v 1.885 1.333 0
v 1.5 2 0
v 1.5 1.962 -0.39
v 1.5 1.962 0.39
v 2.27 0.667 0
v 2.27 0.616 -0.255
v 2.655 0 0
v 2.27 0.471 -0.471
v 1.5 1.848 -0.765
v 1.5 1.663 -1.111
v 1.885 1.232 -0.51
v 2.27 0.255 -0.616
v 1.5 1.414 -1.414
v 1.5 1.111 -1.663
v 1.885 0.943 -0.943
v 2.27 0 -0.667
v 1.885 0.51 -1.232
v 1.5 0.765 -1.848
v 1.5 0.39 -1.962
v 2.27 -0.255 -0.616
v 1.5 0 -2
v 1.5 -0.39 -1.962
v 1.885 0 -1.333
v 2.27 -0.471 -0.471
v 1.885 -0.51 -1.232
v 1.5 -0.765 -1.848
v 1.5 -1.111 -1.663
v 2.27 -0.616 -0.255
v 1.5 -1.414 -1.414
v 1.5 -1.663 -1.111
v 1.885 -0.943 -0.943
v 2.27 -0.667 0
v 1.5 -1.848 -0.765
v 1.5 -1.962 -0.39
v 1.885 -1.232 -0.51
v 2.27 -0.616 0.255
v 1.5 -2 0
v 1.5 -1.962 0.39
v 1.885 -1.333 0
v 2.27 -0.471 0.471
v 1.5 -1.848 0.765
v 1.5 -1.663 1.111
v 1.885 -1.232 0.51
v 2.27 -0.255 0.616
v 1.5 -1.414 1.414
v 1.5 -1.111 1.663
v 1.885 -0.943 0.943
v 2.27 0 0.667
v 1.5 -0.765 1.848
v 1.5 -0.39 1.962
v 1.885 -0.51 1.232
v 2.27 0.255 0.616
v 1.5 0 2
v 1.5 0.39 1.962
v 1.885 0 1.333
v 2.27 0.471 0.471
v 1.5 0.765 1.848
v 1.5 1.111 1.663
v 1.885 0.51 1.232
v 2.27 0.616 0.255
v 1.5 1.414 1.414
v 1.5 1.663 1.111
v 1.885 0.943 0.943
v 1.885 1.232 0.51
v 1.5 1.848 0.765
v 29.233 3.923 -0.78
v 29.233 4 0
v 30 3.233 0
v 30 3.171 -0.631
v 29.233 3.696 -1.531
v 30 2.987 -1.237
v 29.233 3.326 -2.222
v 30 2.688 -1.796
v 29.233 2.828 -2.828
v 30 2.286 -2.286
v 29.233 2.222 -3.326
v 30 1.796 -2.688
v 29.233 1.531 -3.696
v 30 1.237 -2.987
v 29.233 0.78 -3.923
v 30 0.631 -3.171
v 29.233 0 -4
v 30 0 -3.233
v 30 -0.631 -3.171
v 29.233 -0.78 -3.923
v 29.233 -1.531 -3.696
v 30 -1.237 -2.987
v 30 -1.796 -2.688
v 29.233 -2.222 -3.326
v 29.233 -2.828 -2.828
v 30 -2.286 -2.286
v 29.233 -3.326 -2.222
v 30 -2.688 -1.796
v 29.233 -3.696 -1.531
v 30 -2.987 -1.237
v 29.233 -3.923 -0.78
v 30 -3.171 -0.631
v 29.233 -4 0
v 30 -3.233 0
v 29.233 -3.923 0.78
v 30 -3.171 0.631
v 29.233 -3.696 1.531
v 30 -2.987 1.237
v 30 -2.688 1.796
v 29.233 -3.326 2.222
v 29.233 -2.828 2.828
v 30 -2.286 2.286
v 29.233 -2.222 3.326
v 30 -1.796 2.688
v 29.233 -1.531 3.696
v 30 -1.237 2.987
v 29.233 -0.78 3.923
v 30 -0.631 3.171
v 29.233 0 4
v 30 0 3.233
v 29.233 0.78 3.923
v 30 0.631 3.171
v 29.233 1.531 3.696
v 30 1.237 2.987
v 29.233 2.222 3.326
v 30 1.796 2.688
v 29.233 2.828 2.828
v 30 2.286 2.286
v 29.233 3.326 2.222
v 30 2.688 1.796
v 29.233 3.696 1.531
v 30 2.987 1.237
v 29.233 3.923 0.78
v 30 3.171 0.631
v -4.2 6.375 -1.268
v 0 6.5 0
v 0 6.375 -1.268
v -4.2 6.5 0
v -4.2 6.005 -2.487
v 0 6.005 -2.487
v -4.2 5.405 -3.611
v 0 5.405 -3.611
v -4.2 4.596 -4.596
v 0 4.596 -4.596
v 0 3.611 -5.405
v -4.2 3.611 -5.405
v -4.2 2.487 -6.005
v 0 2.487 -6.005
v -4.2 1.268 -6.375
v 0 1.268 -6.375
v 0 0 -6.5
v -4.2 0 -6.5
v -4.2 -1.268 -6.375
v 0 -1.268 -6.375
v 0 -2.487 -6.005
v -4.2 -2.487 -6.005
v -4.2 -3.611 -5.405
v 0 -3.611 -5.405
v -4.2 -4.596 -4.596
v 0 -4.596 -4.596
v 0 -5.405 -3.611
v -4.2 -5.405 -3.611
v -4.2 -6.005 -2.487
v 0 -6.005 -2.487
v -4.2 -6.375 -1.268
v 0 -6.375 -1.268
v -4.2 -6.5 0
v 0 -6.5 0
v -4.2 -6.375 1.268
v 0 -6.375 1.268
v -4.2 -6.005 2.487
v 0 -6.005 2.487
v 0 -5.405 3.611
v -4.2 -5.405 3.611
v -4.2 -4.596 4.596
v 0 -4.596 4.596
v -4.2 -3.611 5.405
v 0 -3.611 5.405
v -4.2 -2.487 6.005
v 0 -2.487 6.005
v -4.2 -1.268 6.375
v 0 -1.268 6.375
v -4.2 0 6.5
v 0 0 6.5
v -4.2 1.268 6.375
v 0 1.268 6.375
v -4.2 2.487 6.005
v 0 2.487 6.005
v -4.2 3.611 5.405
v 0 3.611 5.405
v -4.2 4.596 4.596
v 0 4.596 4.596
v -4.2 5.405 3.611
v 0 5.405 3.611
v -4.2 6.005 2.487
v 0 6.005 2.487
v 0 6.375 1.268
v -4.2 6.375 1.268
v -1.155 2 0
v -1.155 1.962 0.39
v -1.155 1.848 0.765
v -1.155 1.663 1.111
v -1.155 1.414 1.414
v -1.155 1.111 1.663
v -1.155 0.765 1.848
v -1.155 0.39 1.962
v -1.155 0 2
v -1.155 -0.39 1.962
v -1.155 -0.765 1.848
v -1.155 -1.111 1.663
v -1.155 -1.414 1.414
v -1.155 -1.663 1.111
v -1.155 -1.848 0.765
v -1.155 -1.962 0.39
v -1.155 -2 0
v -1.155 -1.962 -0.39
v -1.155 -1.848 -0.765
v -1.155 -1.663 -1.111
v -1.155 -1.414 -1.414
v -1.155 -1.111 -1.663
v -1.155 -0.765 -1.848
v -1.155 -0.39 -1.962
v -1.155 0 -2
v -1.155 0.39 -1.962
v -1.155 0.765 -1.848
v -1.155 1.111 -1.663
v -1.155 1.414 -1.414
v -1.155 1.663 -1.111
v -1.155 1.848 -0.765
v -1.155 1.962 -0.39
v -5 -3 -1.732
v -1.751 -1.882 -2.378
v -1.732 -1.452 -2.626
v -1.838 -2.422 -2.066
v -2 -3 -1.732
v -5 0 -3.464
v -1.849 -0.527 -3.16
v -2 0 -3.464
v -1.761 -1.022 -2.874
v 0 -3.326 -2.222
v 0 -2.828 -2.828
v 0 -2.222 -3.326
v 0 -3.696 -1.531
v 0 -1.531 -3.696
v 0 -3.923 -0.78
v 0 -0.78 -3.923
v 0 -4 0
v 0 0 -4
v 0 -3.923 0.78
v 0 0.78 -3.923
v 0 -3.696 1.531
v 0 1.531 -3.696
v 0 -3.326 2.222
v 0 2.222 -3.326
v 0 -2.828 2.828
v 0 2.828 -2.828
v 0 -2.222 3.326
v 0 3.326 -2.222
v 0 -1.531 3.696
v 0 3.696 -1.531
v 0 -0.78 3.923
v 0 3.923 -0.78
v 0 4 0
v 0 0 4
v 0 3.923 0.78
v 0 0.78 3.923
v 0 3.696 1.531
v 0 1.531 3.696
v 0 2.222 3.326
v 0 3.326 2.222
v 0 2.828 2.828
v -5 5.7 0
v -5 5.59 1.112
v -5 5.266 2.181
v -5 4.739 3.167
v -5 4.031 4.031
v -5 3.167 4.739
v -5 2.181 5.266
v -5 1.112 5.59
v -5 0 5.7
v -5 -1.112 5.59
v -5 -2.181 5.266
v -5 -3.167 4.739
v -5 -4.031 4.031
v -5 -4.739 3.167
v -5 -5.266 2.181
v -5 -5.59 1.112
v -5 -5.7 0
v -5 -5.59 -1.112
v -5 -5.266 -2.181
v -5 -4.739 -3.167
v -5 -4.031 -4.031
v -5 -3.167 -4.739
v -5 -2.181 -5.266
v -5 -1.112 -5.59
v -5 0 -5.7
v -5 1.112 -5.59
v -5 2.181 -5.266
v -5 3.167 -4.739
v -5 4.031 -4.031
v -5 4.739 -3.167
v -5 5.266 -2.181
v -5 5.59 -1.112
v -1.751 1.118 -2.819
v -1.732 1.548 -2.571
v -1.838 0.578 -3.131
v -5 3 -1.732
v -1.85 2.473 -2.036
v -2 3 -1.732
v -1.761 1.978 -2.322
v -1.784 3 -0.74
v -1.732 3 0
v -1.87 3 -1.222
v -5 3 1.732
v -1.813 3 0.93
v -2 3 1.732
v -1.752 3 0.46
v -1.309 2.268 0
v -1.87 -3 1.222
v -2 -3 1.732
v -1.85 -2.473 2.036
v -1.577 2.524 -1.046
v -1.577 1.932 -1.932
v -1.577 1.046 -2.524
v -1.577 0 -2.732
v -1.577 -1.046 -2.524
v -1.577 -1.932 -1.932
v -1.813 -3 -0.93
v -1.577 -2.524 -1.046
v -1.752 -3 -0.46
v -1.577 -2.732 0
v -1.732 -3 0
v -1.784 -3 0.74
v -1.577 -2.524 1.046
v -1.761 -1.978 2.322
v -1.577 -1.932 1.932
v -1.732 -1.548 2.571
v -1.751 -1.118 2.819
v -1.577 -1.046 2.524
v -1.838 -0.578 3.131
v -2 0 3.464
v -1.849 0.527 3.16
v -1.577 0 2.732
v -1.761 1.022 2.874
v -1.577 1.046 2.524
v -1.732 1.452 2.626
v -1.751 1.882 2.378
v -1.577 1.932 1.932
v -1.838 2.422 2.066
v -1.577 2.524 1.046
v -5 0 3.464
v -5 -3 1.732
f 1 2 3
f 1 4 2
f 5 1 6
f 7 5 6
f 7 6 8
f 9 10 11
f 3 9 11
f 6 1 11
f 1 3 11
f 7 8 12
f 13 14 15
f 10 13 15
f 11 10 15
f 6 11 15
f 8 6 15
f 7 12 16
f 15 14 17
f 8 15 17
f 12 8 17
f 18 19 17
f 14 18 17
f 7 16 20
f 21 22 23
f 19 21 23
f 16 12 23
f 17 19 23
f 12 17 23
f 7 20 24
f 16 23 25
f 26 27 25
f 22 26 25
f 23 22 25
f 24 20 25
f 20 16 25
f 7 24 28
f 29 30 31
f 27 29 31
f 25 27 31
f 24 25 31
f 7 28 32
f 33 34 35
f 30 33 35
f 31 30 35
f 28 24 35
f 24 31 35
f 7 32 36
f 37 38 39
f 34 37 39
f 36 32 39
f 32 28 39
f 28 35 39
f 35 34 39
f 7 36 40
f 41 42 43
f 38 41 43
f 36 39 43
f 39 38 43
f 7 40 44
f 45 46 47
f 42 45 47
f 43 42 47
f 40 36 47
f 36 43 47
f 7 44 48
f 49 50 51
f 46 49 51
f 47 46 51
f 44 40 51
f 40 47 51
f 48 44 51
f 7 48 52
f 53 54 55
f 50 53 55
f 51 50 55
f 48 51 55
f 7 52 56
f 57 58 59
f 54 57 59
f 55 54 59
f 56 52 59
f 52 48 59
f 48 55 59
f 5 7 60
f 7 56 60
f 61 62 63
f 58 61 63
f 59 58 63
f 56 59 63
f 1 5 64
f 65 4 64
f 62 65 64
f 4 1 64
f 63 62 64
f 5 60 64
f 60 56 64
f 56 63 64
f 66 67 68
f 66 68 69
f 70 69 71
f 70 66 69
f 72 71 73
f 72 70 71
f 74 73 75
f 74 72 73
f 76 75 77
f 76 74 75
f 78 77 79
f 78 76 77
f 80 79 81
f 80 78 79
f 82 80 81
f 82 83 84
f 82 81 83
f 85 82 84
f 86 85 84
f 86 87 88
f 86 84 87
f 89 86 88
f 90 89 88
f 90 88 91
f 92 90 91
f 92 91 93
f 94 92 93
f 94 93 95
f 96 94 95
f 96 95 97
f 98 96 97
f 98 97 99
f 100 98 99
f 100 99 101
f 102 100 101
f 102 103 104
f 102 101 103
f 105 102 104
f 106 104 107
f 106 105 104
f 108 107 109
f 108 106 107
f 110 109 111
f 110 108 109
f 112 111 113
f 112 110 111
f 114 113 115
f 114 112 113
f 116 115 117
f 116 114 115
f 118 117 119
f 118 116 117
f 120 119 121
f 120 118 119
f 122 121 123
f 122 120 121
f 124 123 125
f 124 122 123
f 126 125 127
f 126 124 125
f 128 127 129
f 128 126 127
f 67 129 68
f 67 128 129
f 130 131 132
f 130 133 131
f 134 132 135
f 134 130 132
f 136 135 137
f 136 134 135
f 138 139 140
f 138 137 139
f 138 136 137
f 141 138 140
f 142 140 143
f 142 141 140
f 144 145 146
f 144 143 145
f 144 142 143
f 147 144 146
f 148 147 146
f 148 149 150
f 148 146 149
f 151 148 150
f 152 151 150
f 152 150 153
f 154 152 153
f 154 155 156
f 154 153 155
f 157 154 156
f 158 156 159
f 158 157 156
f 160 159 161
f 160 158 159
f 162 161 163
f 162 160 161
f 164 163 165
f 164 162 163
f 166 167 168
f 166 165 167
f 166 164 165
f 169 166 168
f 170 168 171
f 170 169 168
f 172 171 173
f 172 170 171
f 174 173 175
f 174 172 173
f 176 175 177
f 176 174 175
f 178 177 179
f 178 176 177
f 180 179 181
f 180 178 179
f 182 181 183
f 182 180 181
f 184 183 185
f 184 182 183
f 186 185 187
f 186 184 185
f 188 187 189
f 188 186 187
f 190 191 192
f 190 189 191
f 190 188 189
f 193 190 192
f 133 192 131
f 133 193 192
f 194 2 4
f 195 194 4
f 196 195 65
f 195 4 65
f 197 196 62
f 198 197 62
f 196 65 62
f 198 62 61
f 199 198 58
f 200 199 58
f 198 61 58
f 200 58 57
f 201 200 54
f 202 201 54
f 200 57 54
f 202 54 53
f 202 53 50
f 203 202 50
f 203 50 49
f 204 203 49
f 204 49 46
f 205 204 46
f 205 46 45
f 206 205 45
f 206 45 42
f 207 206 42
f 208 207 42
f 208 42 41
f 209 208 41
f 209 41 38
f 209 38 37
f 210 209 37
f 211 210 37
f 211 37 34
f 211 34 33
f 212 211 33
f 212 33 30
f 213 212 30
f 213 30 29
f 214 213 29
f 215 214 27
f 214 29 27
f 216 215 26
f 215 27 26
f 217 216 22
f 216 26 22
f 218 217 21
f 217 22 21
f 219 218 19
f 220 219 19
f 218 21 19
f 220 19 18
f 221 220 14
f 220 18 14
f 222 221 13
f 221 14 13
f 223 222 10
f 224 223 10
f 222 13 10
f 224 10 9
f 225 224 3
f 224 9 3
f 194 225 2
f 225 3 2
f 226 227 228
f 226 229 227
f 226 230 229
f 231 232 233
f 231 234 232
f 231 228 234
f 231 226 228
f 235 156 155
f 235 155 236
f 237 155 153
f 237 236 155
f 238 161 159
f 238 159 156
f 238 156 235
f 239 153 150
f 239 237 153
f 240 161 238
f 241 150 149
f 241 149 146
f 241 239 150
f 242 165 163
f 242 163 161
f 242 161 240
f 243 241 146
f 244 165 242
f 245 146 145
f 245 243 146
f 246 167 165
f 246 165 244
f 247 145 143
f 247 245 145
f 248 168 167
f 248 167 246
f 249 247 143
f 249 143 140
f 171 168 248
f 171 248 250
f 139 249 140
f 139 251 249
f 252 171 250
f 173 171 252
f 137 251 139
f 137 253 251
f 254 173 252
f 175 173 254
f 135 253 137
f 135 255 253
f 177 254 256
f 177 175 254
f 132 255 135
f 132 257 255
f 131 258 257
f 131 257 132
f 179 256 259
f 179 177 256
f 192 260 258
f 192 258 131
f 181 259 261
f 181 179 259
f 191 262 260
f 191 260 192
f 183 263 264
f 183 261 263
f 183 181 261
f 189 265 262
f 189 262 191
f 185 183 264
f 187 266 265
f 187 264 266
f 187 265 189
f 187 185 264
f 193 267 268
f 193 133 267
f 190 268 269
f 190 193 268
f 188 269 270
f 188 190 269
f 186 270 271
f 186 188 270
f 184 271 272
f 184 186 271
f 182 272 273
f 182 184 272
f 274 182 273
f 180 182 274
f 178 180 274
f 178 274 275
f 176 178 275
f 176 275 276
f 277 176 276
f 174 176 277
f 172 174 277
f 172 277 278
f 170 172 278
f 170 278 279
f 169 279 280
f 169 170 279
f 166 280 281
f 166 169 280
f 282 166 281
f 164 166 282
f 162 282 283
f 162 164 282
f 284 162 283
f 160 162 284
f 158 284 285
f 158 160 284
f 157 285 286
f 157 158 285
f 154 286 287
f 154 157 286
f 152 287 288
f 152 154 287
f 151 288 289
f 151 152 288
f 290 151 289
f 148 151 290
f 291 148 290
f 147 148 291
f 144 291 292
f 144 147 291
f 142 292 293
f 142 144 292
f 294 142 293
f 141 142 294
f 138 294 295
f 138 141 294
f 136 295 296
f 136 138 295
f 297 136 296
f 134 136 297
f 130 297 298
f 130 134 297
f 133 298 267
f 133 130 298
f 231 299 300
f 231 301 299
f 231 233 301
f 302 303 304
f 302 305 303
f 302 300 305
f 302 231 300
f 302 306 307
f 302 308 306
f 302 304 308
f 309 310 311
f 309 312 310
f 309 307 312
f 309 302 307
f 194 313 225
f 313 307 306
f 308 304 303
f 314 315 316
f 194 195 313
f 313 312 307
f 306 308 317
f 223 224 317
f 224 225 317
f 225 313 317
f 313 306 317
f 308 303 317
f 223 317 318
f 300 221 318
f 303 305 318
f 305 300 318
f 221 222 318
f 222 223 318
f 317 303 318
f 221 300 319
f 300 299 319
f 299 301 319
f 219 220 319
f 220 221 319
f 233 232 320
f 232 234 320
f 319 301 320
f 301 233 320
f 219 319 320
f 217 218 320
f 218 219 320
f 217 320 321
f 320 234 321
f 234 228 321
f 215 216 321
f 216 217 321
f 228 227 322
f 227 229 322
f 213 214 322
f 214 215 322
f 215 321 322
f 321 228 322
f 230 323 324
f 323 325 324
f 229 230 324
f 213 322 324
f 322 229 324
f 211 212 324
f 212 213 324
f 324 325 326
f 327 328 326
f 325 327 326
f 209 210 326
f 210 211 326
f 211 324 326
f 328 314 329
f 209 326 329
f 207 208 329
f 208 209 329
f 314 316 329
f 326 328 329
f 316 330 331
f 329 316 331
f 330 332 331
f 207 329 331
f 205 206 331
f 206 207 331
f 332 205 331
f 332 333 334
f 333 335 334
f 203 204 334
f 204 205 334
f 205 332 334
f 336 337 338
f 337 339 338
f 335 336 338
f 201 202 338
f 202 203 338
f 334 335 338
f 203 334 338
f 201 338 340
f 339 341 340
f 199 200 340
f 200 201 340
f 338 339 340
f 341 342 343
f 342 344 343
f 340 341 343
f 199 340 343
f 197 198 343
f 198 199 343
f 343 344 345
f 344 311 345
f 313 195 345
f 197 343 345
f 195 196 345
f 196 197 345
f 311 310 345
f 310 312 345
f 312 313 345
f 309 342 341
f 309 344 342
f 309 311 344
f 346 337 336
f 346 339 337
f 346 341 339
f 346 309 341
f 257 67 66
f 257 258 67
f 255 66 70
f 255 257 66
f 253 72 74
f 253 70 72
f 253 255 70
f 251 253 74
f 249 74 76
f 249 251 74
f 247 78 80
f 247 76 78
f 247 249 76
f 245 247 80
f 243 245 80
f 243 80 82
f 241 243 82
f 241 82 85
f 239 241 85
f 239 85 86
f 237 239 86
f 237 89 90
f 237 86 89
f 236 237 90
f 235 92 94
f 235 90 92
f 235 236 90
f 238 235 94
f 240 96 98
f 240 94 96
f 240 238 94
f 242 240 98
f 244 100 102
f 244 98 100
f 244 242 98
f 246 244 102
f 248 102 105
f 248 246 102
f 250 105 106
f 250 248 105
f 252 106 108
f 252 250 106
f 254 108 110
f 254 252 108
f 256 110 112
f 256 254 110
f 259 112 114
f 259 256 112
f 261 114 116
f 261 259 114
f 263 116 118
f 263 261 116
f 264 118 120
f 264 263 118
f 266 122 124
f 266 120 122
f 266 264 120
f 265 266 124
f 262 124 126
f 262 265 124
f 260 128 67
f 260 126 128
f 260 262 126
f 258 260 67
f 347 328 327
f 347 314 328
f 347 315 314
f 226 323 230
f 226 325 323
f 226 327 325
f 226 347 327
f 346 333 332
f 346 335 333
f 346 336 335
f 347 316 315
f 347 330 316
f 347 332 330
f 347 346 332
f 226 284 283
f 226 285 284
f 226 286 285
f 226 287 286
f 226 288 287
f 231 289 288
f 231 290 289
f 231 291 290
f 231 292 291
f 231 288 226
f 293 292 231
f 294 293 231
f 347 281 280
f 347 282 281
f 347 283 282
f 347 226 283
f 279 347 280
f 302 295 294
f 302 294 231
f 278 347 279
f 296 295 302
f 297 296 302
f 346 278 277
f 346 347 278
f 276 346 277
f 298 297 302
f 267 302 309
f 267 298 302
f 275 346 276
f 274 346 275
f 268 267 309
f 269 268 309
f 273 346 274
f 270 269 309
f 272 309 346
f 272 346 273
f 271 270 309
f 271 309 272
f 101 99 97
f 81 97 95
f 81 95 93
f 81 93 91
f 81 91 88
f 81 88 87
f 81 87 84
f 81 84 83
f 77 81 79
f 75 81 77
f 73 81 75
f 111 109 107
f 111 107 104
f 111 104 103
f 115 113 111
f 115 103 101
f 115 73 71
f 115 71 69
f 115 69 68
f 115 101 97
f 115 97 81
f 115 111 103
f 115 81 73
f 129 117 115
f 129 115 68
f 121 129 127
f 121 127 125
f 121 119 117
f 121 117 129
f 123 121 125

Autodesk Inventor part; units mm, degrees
ref_plane "YZ Plane" through (0, 0, 0) normal (1, 0, 0) x (0, 1, 0)
ref_plane "XZ Plane" through (0, 0, 0) normal (0, 1, 0) x (-1, 0, 0)
sketch "Schizzo1" plane through (0, 0, 0) normal (0, 0, 1) x (1, 0, 0)
  line L0 (2.6547, 0) -> (30, 0)
  line L1 (30, 0) -> (30, 4)
  line L2 (30, 4) -> (0, 4)
  line L3 (0, 4) -> (0, 6.5)
  line L4 (0, 6.5) -> (-5, 6.5)
  line L5 (-5, 6.5) -> (-5, 3.4641)
  line L6 (-5, 3.4641) -> (-2, 3.4641)
  line L7 (-2, 3.4641) -> (-1.1547, 2)
  line L8 (-12, 0) -> (37, 0) projected
  line L9 (0, -1.3) -> (0, 7.8) projected
  line L10 (-1.1547, 2) -> (1.5, 2)
  line L11 (1.5, 2) -> (2.6547, 0)
  line L12 (-5, 3.4641) -> (-5, 0) construction
  line L13 (-5, 5.7) -> (-4.2, 6.5)
  dimension "d0" = 5
  dimension "d1" = 3
  dimension "d2" = 60
  dimension "d3" = 8
  dimension "d4" = 6.9282
  dimension "d5" = 13
  dimension "d15" = 6.5
  dimension "d16" = 4
  dimension "d17" = 30
  dimension "d32" = 45
  dimension "d33" = 0.8
revolve "Corpo" add sketch "Schizzo1" angle 360 about axis through (2.6547, 0, 0) along (1, 0, 0) contours L11 L10 L9 L2 L1 L0 | L10 L7 L6 L5 L13 L4 L3 L9 | L13 L5 L4
revolve "Smusso2" cut sketch "Schizzo1" angle 360 about axis through (-10, 0, 0) along (1, 0, 0) contours L13 L5 L4
sketch "Schizzo2" plane through (-5, 0, 0) normal (-1, 0, 0) x (0, 0, 1)
  circle A0 centre (0, 0) radius 3.4641 projected
  line L0 (0, -9.1) -> (0, 9.1) projected
  line L1 (-9.1, 0) -> (9.1, 0) projected
  line L2 (3.4641, 0) -> (1.7321, -3)
  line L3 (1.7321, -3) -> (-1.7321, -3)
  line L4 (-1.7321, -3) -> (-3.4641, 0)
  line L5 (-3.4641, 0) -> (-1.7321, 3)
  line L6 (-1.7321, 3) -> (1.7321, 3)
  line L7 (1.7321, 3) -> (3.4641, 0)
  point P0 (0, 0)
extrude "Intaglio" add sketch "Schizzo2" against normal up to next contours L7 A0 | A0 L2 | L6 L0 A0 | A0 L0 L3 | L0 L6 A0 | A0 L3 L0 | L4 A0 | A0 L5
thread "Filettatura" size "M8x1.25" class "6g" standard "ISO Metric profile" length 23
chamfer "Smusso1" distance 0.7668 distance2 0.7668 1 edges at (30, -4, 0) measured on face at (30, -0.4013, -0.6579)
ref_plane "Work Plane1" through (15, 0, 0) normal (0, 0.5, 0.866) x (1, 0, 0)
equation "\"d0\" = KOH"
equation "\"d1\" = INTI"
equation "\"d3\" = GD"
equation "\"d4\" = 1.1547 * SW"
equation "\"d5\" = KOD"
equation "\"d15\" = INFT"
equation "\"d16\" = SDT"
equation "\"d17\" = NLG"
equation "\"d33\" = Cham"
equation "\"d7\" = GEL"
equation "\"d9\" = -0.5 * SPD + 0.5 * GD"
equation "\"d12\" = GUL"
equation "\"GD\" = NND"
equation "\"NLG\" = 30"
equation "\"GEL\" = 23"
equation "\"KOD\" = 13"
equation "\"KOH\" = 5"
equation "\"GUL\" = 0.61345 * PTC"
equation "\"SW\" = 6"
equation "\"INTI\" = 3"
equation "\"SPD\" = NND - 1.2269 * PTC"
equation "\"SDT\" = 4"
equation "\"INFT\" = 6.5"
equation "\"Cham\" = 0.8"
equation "\"TOA\" = 30deg"
equation "\"GD1\" = THREADDIA - 1.2269 * PTC"
equation "\"THREADDIA\" = 8"
equation "\"BDM\" = NND"
equation "\"FAWI\" = 45deg"
equation "\"RR\" = 0.1 * NND"
equation "\"PTC\" = 1.25"
equation "\"NND\" = 8"
equation "\"FAWI1\" = 45deg"
equation "\"GAL\" = 0.61345 * PTC"
equation "\"E0\" = 1.155 * SW"
properties part number "DIN 6912 - M8 x 30" material "Acciaio, Dolce"
